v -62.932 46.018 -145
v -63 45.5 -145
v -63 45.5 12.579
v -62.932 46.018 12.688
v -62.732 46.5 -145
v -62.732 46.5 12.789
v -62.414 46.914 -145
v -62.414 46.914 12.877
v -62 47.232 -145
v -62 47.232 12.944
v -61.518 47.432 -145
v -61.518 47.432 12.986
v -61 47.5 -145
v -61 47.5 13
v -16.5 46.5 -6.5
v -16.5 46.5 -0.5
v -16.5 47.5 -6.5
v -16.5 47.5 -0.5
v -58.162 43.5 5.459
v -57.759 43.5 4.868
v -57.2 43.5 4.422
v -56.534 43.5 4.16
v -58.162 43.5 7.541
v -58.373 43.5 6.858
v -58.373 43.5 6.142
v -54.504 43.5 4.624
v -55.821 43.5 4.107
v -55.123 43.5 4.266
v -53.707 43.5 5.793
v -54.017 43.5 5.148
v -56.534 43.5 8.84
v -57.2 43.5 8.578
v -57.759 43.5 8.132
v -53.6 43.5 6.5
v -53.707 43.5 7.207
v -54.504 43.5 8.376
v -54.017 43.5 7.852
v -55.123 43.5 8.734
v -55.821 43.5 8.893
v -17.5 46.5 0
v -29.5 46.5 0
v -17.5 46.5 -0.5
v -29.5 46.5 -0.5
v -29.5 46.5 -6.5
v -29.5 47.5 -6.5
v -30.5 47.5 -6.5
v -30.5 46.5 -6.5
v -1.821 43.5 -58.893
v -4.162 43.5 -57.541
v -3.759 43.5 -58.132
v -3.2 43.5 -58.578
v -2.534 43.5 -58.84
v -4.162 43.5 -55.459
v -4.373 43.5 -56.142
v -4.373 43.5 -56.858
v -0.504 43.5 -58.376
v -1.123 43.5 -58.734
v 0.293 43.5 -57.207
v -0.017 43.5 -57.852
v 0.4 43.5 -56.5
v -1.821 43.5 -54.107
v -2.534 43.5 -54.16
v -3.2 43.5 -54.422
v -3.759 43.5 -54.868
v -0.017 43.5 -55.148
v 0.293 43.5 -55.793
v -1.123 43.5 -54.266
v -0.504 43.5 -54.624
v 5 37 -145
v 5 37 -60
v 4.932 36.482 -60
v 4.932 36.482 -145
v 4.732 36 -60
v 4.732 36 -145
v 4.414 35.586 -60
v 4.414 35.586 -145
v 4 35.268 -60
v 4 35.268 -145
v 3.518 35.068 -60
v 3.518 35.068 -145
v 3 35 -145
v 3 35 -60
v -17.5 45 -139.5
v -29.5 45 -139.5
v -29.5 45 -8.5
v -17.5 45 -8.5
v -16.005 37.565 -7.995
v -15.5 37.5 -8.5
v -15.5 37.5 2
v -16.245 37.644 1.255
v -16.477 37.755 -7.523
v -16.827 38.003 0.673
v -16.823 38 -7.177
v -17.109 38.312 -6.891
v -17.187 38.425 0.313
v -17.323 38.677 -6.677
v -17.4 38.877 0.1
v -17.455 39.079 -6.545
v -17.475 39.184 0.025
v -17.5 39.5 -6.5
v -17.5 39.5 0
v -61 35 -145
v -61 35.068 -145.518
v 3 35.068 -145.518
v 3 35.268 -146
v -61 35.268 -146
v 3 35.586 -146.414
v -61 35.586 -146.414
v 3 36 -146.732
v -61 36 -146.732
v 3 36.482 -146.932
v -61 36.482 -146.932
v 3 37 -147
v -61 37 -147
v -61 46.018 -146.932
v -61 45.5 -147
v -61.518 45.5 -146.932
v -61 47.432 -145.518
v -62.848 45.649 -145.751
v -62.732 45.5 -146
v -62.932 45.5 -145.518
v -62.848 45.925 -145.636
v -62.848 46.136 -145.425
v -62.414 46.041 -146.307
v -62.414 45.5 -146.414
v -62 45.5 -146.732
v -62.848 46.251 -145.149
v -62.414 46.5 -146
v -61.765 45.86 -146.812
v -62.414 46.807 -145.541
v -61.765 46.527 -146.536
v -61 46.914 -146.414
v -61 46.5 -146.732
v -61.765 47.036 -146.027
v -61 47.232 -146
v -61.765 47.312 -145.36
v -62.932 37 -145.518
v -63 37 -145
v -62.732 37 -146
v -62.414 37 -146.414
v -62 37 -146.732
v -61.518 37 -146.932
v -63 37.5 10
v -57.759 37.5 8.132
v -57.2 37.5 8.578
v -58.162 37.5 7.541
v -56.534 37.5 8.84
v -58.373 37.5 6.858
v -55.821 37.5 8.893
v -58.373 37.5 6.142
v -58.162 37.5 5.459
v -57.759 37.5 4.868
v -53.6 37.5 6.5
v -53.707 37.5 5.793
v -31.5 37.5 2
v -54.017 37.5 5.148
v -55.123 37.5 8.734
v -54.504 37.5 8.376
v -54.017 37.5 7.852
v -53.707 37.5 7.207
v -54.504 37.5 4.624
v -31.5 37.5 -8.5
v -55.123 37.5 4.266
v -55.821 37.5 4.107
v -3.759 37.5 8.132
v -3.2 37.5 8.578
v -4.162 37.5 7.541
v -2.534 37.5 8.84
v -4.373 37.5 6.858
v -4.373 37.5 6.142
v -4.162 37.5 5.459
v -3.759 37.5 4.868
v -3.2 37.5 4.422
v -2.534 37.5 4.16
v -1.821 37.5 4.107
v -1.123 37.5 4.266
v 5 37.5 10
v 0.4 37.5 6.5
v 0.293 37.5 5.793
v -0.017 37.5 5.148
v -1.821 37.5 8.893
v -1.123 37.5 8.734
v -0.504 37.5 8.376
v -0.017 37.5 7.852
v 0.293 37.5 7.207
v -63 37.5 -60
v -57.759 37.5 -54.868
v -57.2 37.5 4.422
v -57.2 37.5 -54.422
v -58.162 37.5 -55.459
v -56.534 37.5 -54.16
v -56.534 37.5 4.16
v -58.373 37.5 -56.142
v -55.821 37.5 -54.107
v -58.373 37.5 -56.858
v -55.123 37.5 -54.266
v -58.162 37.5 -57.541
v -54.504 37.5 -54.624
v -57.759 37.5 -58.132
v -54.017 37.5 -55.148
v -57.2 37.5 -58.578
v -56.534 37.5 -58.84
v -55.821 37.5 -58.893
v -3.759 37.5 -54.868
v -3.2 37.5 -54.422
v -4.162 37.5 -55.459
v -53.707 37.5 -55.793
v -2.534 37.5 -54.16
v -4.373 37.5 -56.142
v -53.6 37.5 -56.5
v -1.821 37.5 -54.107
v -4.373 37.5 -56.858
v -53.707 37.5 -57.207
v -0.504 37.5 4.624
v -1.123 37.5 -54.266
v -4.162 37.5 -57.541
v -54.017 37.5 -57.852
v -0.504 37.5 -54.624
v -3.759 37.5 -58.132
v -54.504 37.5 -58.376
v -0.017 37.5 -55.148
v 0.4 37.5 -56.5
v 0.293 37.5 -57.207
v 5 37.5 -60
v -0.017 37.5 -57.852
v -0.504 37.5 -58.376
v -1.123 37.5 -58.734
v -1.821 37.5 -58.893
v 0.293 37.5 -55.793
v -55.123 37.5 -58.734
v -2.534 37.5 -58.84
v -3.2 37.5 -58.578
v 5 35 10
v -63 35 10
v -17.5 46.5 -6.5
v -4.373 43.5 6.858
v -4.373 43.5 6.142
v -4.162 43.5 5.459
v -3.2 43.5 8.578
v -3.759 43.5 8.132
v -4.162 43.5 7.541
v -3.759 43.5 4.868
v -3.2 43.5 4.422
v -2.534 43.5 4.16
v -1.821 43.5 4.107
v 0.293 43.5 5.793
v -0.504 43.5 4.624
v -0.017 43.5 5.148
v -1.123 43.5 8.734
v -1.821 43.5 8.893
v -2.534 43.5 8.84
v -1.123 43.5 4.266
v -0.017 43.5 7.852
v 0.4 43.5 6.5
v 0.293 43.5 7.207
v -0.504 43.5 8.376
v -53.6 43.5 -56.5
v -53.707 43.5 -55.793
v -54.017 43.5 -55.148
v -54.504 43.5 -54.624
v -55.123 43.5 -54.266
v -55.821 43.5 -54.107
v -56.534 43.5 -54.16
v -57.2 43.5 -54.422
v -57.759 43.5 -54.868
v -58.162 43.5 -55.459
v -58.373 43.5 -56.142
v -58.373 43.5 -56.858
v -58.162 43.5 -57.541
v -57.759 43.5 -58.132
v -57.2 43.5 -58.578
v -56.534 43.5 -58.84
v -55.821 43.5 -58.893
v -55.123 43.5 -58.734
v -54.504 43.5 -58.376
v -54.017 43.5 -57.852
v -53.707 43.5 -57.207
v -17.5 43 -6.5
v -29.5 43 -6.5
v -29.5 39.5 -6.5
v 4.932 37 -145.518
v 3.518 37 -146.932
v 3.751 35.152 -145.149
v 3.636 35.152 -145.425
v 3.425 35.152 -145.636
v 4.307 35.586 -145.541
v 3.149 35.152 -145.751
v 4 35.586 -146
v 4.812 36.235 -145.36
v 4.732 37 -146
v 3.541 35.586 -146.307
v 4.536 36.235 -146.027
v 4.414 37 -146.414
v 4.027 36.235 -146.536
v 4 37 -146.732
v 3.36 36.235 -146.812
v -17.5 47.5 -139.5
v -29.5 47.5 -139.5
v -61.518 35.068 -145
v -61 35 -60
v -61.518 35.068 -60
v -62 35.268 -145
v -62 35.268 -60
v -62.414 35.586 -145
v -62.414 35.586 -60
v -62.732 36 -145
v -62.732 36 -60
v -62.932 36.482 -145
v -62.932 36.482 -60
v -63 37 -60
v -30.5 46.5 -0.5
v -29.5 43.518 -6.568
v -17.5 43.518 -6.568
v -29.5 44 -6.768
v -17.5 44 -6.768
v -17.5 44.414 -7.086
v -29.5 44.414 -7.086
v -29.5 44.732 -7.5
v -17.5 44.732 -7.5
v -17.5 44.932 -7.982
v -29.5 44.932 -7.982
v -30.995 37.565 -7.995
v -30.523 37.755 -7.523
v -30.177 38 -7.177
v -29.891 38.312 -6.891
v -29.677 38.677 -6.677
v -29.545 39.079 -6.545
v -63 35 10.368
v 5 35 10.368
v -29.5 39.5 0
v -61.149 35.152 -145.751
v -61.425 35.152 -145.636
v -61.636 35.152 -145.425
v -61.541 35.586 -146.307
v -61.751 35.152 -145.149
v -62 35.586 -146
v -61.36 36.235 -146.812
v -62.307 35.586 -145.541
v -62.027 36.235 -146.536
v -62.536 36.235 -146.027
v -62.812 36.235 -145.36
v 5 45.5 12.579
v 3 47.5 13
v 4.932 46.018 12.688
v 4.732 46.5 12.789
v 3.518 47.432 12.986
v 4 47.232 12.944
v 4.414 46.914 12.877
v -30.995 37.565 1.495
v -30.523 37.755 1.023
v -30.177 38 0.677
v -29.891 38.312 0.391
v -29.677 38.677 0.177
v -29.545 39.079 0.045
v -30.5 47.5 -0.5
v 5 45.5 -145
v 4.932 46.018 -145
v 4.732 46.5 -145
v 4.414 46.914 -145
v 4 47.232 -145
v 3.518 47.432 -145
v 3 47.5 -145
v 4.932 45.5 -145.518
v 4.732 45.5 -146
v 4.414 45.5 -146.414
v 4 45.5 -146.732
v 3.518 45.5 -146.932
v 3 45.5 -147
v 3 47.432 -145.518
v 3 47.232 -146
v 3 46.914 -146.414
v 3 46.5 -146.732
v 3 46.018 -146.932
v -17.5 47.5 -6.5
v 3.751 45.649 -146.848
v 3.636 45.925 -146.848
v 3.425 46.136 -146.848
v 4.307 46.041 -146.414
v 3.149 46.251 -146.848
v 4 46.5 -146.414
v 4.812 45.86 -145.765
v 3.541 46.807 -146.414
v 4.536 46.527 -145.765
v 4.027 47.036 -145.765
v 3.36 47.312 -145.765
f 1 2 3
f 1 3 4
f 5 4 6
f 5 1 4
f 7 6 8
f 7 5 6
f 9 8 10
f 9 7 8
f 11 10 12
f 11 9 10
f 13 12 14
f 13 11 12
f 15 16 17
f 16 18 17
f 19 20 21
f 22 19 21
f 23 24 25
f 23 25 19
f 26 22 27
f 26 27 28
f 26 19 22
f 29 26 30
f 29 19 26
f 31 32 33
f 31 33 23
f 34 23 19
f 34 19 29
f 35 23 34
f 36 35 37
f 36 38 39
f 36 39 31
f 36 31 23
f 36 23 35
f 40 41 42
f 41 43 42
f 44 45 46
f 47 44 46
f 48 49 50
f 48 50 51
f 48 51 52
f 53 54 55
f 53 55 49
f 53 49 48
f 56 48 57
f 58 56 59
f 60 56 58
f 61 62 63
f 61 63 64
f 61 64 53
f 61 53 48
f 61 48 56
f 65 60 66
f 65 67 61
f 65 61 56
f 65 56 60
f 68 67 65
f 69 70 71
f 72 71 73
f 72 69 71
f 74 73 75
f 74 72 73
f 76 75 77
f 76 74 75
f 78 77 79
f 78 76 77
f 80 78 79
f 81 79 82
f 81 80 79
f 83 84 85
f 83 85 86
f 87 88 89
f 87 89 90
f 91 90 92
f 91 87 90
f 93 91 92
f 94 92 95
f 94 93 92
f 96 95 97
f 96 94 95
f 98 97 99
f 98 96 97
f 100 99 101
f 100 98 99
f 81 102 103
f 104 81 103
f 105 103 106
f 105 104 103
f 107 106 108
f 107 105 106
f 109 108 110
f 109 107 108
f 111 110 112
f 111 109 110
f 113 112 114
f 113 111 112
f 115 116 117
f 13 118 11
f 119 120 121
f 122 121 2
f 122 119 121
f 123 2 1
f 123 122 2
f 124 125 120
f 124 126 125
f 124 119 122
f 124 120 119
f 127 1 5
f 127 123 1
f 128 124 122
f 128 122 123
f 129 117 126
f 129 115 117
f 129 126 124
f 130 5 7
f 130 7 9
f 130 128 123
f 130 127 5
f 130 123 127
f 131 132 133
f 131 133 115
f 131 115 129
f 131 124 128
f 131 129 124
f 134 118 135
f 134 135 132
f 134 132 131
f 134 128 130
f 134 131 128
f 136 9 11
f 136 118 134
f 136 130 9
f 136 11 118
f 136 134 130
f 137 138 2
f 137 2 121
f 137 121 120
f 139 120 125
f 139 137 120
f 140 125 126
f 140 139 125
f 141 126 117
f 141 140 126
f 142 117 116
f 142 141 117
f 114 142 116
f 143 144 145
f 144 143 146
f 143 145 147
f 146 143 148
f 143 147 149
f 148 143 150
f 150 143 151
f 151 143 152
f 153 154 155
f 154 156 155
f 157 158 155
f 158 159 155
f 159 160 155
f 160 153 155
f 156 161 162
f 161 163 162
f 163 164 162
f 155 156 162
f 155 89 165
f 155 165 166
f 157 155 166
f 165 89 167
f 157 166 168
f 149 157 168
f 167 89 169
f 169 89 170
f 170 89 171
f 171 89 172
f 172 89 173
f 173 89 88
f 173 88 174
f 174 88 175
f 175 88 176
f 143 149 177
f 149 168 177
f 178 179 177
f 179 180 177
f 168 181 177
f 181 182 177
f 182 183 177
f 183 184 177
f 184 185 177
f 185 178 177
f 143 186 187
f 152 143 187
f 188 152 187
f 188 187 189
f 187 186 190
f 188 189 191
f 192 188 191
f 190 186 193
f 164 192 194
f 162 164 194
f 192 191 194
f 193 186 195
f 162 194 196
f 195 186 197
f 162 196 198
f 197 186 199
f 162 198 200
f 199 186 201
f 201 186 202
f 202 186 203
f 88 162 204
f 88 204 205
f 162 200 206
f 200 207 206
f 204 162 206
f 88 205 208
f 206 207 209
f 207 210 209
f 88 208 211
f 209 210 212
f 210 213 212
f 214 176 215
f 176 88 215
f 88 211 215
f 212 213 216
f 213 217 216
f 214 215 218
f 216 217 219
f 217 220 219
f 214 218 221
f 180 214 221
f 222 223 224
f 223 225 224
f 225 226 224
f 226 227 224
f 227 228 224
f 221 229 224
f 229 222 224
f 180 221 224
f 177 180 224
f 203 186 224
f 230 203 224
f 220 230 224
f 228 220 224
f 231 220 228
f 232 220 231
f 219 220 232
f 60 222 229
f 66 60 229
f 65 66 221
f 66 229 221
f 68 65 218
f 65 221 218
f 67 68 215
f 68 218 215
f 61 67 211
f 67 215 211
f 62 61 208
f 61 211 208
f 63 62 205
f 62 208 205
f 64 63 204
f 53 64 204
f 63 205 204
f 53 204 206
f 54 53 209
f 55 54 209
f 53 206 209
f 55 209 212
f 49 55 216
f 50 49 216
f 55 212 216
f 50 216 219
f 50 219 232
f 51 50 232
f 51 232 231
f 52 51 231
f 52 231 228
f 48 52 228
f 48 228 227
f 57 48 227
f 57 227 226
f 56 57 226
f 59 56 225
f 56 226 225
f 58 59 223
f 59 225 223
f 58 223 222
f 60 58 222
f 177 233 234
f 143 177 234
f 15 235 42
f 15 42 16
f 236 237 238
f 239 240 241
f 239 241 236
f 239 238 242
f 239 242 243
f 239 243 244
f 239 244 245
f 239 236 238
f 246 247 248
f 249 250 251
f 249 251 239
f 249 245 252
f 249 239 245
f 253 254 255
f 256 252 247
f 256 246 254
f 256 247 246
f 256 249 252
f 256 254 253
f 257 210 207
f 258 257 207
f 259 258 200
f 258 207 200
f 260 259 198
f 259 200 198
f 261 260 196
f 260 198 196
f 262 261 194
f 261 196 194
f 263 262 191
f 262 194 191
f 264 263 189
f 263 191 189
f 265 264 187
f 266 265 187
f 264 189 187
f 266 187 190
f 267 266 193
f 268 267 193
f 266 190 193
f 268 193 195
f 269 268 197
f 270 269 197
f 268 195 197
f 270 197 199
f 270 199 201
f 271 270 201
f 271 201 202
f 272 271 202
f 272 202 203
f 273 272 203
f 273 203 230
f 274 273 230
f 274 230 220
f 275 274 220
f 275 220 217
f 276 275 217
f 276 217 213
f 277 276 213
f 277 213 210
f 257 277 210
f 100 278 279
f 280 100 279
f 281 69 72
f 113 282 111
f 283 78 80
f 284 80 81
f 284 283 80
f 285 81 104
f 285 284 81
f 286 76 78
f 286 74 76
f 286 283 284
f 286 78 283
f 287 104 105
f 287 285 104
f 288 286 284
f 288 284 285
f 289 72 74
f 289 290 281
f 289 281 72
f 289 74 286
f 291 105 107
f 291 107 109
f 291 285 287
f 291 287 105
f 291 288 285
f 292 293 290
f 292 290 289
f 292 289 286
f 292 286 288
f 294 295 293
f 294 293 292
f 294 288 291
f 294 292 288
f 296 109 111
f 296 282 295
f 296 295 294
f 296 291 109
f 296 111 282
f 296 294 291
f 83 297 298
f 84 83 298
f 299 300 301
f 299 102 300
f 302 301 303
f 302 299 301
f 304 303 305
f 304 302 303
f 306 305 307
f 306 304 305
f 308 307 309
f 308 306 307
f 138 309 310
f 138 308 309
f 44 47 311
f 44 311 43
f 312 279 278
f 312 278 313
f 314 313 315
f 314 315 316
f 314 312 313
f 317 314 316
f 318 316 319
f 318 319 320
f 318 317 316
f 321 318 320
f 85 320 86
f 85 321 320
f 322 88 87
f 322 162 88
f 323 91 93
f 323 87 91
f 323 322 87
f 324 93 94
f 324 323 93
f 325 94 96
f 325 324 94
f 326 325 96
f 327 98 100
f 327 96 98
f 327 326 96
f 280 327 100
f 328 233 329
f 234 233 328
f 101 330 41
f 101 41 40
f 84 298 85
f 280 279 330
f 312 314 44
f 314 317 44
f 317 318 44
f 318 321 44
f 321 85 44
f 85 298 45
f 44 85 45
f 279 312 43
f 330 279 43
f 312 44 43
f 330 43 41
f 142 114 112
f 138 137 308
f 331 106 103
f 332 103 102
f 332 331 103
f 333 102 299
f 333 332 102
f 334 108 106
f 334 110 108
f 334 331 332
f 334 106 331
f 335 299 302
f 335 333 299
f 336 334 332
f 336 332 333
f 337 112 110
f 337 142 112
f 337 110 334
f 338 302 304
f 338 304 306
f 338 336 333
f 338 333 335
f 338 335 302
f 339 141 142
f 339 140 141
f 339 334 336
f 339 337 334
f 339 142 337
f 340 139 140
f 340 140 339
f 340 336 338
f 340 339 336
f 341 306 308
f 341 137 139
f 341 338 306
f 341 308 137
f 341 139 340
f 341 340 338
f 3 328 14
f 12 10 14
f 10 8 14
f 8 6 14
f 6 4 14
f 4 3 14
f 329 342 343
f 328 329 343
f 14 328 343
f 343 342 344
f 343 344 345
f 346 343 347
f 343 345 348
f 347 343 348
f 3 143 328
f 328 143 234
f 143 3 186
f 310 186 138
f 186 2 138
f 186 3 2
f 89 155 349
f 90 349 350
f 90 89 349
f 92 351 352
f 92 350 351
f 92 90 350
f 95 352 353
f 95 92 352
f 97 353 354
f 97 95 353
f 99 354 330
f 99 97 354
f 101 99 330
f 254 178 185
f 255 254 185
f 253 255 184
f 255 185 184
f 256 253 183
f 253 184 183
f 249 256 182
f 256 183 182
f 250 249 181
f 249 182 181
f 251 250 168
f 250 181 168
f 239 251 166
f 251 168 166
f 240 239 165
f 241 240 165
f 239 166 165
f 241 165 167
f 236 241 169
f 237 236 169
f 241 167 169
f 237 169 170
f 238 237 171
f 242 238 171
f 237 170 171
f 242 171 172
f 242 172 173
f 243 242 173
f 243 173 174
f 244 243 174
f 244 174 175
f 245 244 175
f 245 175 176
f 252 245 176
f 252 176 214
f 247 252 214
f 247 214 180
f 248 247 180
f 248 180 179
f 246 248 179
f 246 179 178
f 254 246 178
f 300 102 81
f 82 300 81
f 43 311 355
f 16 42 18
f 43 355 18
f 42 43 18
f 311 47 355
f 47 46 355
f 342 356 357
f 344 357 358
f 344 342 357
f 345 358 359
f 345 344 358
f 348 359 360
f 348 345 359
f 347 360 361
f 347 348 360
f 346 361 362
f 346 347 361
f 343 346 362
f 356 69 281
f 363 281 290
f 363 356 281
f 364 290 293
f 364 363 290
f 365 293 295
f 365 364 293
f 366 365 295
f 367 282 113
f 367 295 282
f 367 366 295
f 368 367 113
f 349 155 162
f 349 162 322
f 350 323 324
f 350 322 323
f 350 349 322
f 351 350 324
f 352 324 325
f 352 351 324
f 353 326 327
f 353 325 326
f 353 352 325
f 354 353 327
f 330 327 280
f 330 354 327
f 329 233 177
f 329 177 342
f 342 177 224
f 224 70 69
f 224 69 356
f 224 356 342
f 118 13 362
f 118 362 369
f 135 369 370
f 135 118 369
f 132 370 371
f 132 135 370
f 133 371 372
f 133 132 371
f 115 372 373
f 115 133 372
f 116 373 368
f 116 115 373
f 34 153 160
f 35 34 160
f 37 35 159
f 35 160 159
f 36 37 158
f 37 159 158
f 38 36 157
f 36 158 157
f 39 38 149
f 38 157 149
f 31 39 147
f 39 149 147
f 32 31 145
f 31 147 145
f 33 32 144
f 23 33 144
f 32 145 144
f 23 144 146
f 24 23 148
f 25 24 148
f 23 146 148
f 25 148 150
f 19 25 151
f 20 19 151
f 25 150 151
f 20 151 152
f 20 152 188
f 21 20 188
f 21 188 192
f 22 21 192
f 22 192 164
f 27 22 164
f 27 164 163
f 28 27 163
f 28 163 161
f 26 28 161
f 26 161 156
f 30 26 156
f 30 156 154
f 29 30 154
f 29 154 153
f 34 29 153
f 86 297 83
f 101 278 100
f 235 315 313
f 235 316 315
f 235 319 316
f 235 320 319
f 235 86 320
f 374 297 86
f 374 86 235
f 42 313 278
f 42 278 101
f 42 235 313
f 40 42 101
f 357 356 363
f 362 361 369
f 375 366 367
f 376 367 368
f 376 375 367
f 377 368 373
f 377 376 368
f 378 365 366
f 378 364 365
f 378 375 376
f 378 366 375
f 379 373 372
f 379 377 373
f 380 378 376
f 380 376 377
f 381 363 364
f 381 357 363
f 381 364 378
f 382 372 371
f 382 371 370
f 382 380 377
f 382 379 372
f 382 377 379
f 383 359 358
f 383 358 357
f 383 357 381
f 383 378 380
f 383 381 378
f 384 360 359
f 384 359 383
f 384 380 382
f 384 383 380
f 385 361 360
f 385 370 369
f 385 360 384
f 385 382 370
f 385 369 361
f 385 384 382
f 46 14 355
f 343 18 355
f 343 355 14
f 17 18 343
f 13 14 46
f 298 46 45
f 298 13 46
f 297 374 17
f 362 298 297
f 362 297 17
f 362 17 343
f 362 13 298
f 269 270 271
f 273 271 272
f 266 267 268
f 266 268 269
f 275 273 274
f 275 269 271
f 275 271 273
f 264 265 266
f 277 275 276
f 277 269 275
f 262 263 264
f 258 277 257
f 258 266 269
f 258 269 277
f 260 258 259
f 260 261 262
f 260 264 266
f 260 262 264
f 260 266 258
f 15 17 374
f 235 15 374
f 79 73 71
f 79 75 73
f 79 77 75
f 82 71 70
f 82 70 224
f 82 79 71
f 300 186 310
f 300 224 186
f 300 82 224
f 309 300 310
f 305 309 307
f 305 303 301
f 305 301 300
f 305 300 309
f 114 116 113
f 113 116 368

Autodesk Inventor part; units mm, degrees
ref_plane "YZ Plane" through (0, 0, 0) normal (1, 0, 0) x (0, 1, 0)
ref_plane "XZ Plane" through (0, 0, 0) normal (0, 1, 0) x (-1, 0, 0)
ref_plane "XY Plane" through (0, 0, 0) normal (0, 0, 1) x (1, 0, 0)
sketch "Эскиз1" plane through (0, 0, 0) normal (0, 1, 0) x (-1, 0, 0)
  line L0 (0, -50) -> (58, -50)
  line L1 (-2, -2) -> (-2, -48)
  line L2 (58, 0) -> (0, 0)
  line L3 (60, -48) -> (60, -2)
  line L4 (-2, 0) -> (60, 0)
  line L5 (60, 0) -> (60, -50)
  line L6 (60, -50) -> (-2, -50)
  line L7 (-2, -50) -> (-2, 0)
  circle A0 centre (2, -4) radius 1.6
  circle A1 centre (55, -4) radius 1.6
  circle A2 centre (55, -46) radius 1.6
  circle A3 centre (2, -46) radius 1.6
  circle A4 centre (2, -4) radius 1.6
  circle A5 centre (55, -4) radius 1.6
  circle A6 centre (55, -46) radius 1.6
  circle A7 centre (2, -46) radius 1.6
  circle A8 centre (2, -4) radius 2.4
  circle A9 centre (2, -4) radius 4
  circle A10 centre (55, -4) radius 4
  circle A11 centre (55, -4) radius 2.4
  circle A12 centre (55, -46) radius 4
  circle A13 centre (55, -46) radius 2.4
  circle A14 centre (2, -46) radius 4
  circle A15 centre (2, -46) radius 2.4
  dimension "d0" = 4.8
  dimension "d1" = 8
  dimension "d2" = 4.8
  dimension "d3" = 8
  dimension "d4" = 4.8
  dimension "d5" = 8
  dimension "d6" = 4.8
  dimension "d7" = 8
extrude "Выдавливание1" add sketch "Эскиз1" along normal blind 2.5 contours L6 L7 L1 A14 L0 | A12 | A10 | A14 L1 A9 L2 L4 L5 L3 L6 L0 | A14 | L1 L7 L4 L2 A9 | A9 | A0 | A1 | A2 | A3 | A8 | A11 | A13 | A15
extrude "Выдавливание2" add sketch "Эскиз1" along normal blind 8.5 contours A12 | A10 | A14 | A9
sketch "Эскиз2" plane through (0, 0, 0) normal (0, -1, 0) x (1, 0, 0)
  line L0 (-60, 0) -> (2, 0) projected
  line L1 (2, 0) -> (2, -50) projected
  line L2 (2, -50) -> (-60, -50) projected
  line L3 (-60, -50) -> (-60, 0) projected
  line L4 (2, 0) -> (2, -50) projected
  line L5 (2.5, -50.5) -> (-60.5, -50.5)
  line L6 (-60.5, -50.5) -> (-60.5, 0.5)
  line L7 (-60.5, 0.5) -> (2.5, 0.5)
  line L8 (2.5, 0.5) -> (2.5, -50.5)
  line L9 (5, -50.5) -> (5, -53)
  line L10 (5, -53) -> (2.5, -53)
  line L11 (5, -53) -> (-63, -53)
  line L12 (-63, -53) -> (-63, 3)
  line L13 (-63, 3) -> (5, 3)
  line L14 (5, 3) -> (5, -53)
  point P0 (0, 0)
  dimension "d14" = 63
  dimension "d15" = 51
  dimension "d16" = 2.5
  dimension "d17" = 2.5
  dimension "d18" = 68
  dimension "d19" = 56
extrude "Выдавливание3" add sketch "Эскиз2" against normal blind 2.5 contours L5 L6 L7 L8
extrude "Выдавливание4" add sketch "Эскиз2" against normal blind 35 contours L9 L10 L11 L12 L13 L14
sketch "Эскиз3" plane through (-63, 0, 3) normal (0, 0, 1) x (1, 0, 0)
  line L0 (0, 0) -> (0, 35) projected
  line L1 (0, 35) -> (68, 35)
  line L2 (68, 35) -> (68, 50)
  line L3 (68, 50) -> (0, 50)
  line L4 (0, 50) -> (0, 35)
  point P0 (63, 0)
  dimension "d24" = 15
extrude "Выдавливание5" add sketch "Эскиз3" against normal blind 150
sketch "Эскиз4" plane through (-63, 50, 3) normal (0, 1, 0) x (1, 0, 0)
  line L0 (0, 0) -> (0, 56) projected
  line L1 (68, 0) -> (68, 150) projected
  line L2 (0, 0) -> (68, 0)
  line L3 (68, 0) -> (68, 150)
  line L4 (68, 150) -> (0, 150)
  line L5 (0, 150) -> (0, 0)
  point P0 (63, 3)
extrude "Выдавливание6" cut sketch "Эскиз4" against normal blind 2.5
sketch "Эскиз5" plane through (-63, 47.5, 3) normal (0, 1, 0) x (1, 0, 0)
  line L0 (0, 56) -> (0, 150) projected
  line L1 (0, 150) -> (10, 150)
  line L2 (10, 150) -> (10, 140)
  line L3 (10, 140) -> (0, 140)
  line L4 (0, 140) -> (0, 150)
  line L5 (68, 150) -> (0, 150) projected
  line L6 (68, 150) -> (58, 150)
  line L7 (58, 150) -> (58, 140)
  line L8 (58, 140) -> (68, 140)
  line L9 (68, 140) -> (68, 150)
  line L10 (0, 0) -> (0, 56) projected
  line L11 (0, 0) -> (10, 0)
  line L12 (10, 0) -> (10, 10)
  line L13 (10, 10) -> (0, 10)
  line L14 (0, 10) -> (0, 0)
  line L15 (10, 10) -> (58, 10)
  line L16 (58, 10) -> (58, 140)
  line L17 (58, 140) -> (10, 140)
  line L18 (10, 140) -> (10, 10)
  point P0 (63, 3)
  dimension "d29" = 10
  dimension "d30" = 10
  dimension "d31" = 10
  dimension "d32" = 10
  dimension "d33" = 10
  dimension "d34" = 10
extrude "Выдавливание7" cut sketch "Эскиз5" against normal blind 10 contours L17 L16 L15 L18
sketch "Эскиз6" plane through (-63, 37.5, 3) normal (0, 1, 0) x (1, 0, 0)
  line L0 (58, 140) -> (10, 140) projected
  line L1 (10, 140) -> (10, 10) projected
  line L2 (10, 10) -> (58, 10) projected
  line L3 (58, 10) -> (58, 140) projected
  line L4 (0, 150) -> (68, 150) projected
  line L5 (68, 150) -> (68, 0) projected
  line L6 (68, 0) -> (0, 0) projected
  line L7 (0, 0) -> (0, 150) projected
  line L8 (68, 56) -> (0, 56) projected
  line L9 (0, 56) -> (10, 56)
  line L10 (10, 56) -> (10, 46)
  line L11 (10, 46) -> (0, 46)
  line L12 (0, 46) -> (0, 56)
  line L13 (10, 46) -> (58, 46)
  line L14 (58, 46) -> (58, 10)
  line L15 (58, 10) -> (10, 10)
  line L16 (10, 10) -> (10, 46)
  point P0 (63, 3)
  dimension "d37" = 10
  dimension "d38" = 10
extrude "Выдавливание8" cut sketch "Эскиз6" against normal blind 10 contours L3 L2 L1 L13
sketch "Эскиз7" plane through (-63, 47.5, 3) normal (0, 1, 0) x (1, 0, 0)
  line L0 (0, 0) -> (0, 150) projected
  line L1 (0, 150) -> (2.5, 150)
  line L2 (2.5, 150) -> (2.5, 147.5)
  line L3 (2.5, 147.5) -> (0, 147.5)
  line L4 (0, 147.5) -> (0, 150)
  line L5 (68, 150) -> (68, 0) projected
  line L6 (68, 150) -> (65.5, 150)
  line L7 (65.5, 150) -> (65.5, 147.5)
  line L8 (65.5, 147.5) -> (68, 147.5)
  line L9 (68, 147.5) -> (68, 150)
  line L10 (2.5, 2.5) -> (2.5, 53.5) projected
  line L11 (65.5, 147.5) -> (2.5, 147.5)
  line L12 (2.5, 147.5) -> (2.5, 10)
  line L13 (2.5, 10) -> (65.5, 10)
  line L14 (65.5, 10) -> (65.5, 147.5)
  point P0 (63, 3)
  dimension "d41" = 2.5
  dimension "d42" = 2.5
  dimension "d43" = 2.5
  dimension "d44" = 2.5
  dimension "d45" = 137.5
extrude "Выдавливание9" cut sketch "Эскиз7" against normal blind 10 contours L11 L14 L13 L10 L12
sketch "Эскиз8" plane through (-63, 37.5, 3) normal (0, 1, 0) x (1, 0, 0)
  line L0 (58, 10) -> (58, 46) projected
  line L1 (58, 46) -> (10, 46) projected
  line L2 (10, 46) -> (10, 10) projected
  line L3 (2.5, 10) -> (10, 10) projected
  line L4 (2.5, 147.5) -> (2.5, 10) projected
  line L5 (65.5, 147.5) -> (2.5, 147.5) projected
  line L6 (65.5, 10) -> (65.5, 147.5) projected
  line L7 (58, 10) -> (65.5, 10) projected
  line L8 (10, 10) -> (58, 10) projected
  line L9 (0, 150) -> (68, 150) projected
  line L10 (68, 150) -> (68, 0) projected
  line L11 (68, 0) -> (0, 0) projected
  line L12 (0, 0) -> (0, 150) projected
  circle A0 centre (8, 49) radius 2.4 projected
  line L13 (2.5, 53.5) -> (65.5, 53.5) projected
  line L14 (65.5, 147.5) -> (65.5, 10) projected
  circle A1 centre (61, 49) radius 4 projected
  circle A2 centre (8, 7) radius 4 projected
  circle A3 centre (8, 49) radius 4 projected
  line L15 (2.5, 2.5) -> (65.5, 2.5) projected
  line L16 (65.5, 2.5) -> (65.5, 53.5) projected
  line L17 (65.5, 53.5) -> (2.5, 53.5) projected
  line L18 (2.5, 53.5) -> (2.5, 2.5) projected
  circle A4 centre (61, 7) radius 4 projected
  circle A5 centre (8, 7) radius 4 projected
  line L19 (2.5, 2.5) -> (2.5, 53.5) projected
  line L20 (65.5, 2.5) -> (2.5, 2.5) projected
  line L21 (65.5, 53.5) -> (65.5, 2.5) projected
  circle A6 centre (61, 7) radius 2.4 projected
  line L22 (2.5, 53.5) -> (65.5, 53.5)
  line L23 (65.5, 53.5) -> (65.5, 2.5)
  line L24 (65.5, 2.5) -> (2.5, 2.5)
  line L25 (2.5, 2.5) -> (2.5, 53.5)
  point P0 (63, 3)
  point P1 (58.3542, 10)
  point P2 (63.6458, 10)
  point P3 (10.6458, 10)
  point P4 (10, 10.4641)
  point P5 (10, 45.5359)
  point P6 (10.6458, 46)
extrude "Выдавливание10" cut sketch "Эскиз8" along normal mid plane 20 contours L0 L1 A3 L2 A2 L3 L4 L13 L6 L7 A4 | L7 A4 L16 L15 L18 L3 A2 L8 | A4 L7 | L7 A4 | A2 L3 L8 | L8 L2 A2 | A3 L2 L1 | L1 L2 A3 | L3 A2 L2 | A0 | A1 | A6
sketch "Эскиз9" plane through (-63, 0, 3) normal (0, 0, 1) x (1, 0, 0)
  line L0 (68, 0) -> (68, 47.5) projected
  line L1 (68, 35) -> (0, 35) projected
  line L2 (68, 47.5) -> (0, 47.5)
  line L3 (0, 47.5) -> (0, 35)
  line L4 (0, 35) -> (68, 35)
  line L5 (68, 35) -> (68, 47.5)
  point P0 (63, 0)
extrude "Выдавливание11" add sketch "Эскиз9" along normal blind 10
sketch "Эскиз12" plane through (-63, 37.5, 3) normal (0, 1, 0) x (1, 0, 0)
  line L0 (65.5, 2.5) -> (65.5, 53.5) projected
  line L1 (65.5, 53.5) -> (55.5, 53.5)
  line L2 (55.5, 53.5) -> (55.5, 63.5)
  line L3 (55.5, 63.5) -> (65.5, 63.5)
  line L4 (65.5, 63.5) -> (65.5, 53.5)
  line L5 (2.5, 53.5) -> (2.5, 2.5) projected
  line L6 (2.5, 53.5) -> (12.5, 53.5)
  line L7 (12.5, 53.5) -> (12.5, 63.5)
  line L8 (12.5, 63.5) -> (2.5, 63.5)
  line L9 (2.5, 63.5) -> (2.5, 53.5)
  point P0 (63, 3)
  dimension "d52" = 10
  dimension "d53" = 10
  dimension "d54" = 10
extrude "Выдавливание12" add sketch "Эскиз12" along normal blind 10
sketch "Эскиз16" plane through (0, 0, 0) normal (0, -1, 0) x (1, 0, 0)
  line L0 (5, -53) -> (5, 3) projected
  line L1 (-63, -53) -> (5, -53) projected
  line L2 (5, 3) -> (-63, 3)
  line L3 (-63, 3) -> (-63, -53)
  line L4 (-63, -53) -> (5, -53)
  line L5 (5, -53) -> (5, 3)
  line L6 (-63, -147) -> (-63, 13) projected
  line L7 (5, -53) -> (-63, -53)
  line L8 (-63, -53) -> (-63, -60)
  line L9 (-63, -60) -> (5, -60)
  line L10 (5, -60) -> (5, -53)
  line L11 (-63, 3) -> (-63, -53) projected
  line L12 (5, -147) -> (5, 13) projected
  line L13 (-63, 3) -> (5, 3)
  line L14 (5, 3) -> (5, 10)
  line L15 (5, 10) -> (-63, 10)
  line L16 (-63, 10) -> (-63, 3)
  point P0 (0, 0)
  dimension "d59" = 7
  dimension "d60" = 7
extrude "Выдавливание13" cut sketch "Эскиз16" against normal blind 37.5
sketch "Эскиз17" plane through (-63, 47.5, 3) normal (0, 1, 0) x (1, 0, 0)
  line L0 (68, -10) -> (0, -10)
  line L1 (0, -10) -> (0, 150)
  line L2 (0, 150) -> (68, 150)
  line L3 (68, 150) -> (68, -10)
  line L4 (45.5, 63.5) -> (45.5, 127.5)
  line L5 (2.5, 147.5) -> (65.5, 147.5) projected
  line L6 (45.5, 127.5) -> (45.5, 132.5)
  line L7 (33.5, 132.5) -> (33.5, 7.5)
  line L8 (33.5, 7.5) -> (45.5, 7.5)
  line L9 (45.5, 7.5) -> (45.5, 63.5)
  line L10 (33.5, 132.5) -> (32, 132.5)
  line L11 (32, 132.5) -> (32, 134)
  line L12 (32, 134) -> (33.5, 134)
  line L13 (33.5, 134) -> (33.5, 132.5)
  line L14 (45.5, 7.5) -> (47, 7.5)
  line L15 (47, 7.5) -> (47, 6)
  line L16 (47, 6) -> (45.5, 6)
  line L17 (45.5, 6) -> (45.5, 7.5)
  line L18 (47, 6) -> (32, 6)
  line L19 (32, 6) -> (32, 134)
  line L20 (47, 134) -> (47, 6)
  line L21 (45.5, 134) -> (45.5, 132.5)
  line L22 (33.5, 132.5) -> (33.5, 134)
  line L23 (47, 134) -> (47, 144)
  line L24 (47, 144) -> (32, 144)
  line L25 (32, 144) -> (32, 134)
  line L26 (33.5, 134) -> (32, 134)
  line L27 (32, 134) -> (32, 144)
  line L28 (32, 144) -> (33.5, 144)
  line L29 (33.5, 144) -> (33.5, 134)
  line L30 (45.5, 134) -> (47, 134)
  line L31 (47, 134) -> (47, 144)
  line L32 (47, 144) -> (45.5, 144)
  line L33 (45.5, 144) -> (45.5, 134)
  line L34 (32, 144) -> (47, 144)
  line L35 (47, 144) -> (47, 142.5)
  line L36 (47, 142.5) -> (32, 142.5)
  line L37 (32, 142.5) -> (32, 144)
  line L38 (32, 6) -> (47, 6)
  line L39 (47, 6) -> (47, 7.5)
  line L40 (47, 7.5) -> (32, 7.5)
  line L41 (32, 7.5) -> (32, 6)
  point P0 (63, 3)
  point P1 (55.5, 63.5)
  point P2 (33.5, 142.5)
  point P3 (45.5, 142.5)
  dimension "d64" = 64
  dimension "d65" = 5
  dimension "d66" = 12
  dimension "d67" = 125
  dimension "d68" = 1.5
  dimension "d69" = 1.5
  dimension "d70" = 1.5
  dimension "d71" = 1.5
  dimension "d72" = 10
  dimension "d73" = 1.5
extrude "Выдавливание14" add sketch "Эскиз17" against normal up to surface (10 mm away) contours L4 L6 L21 L30 L20 L14 L9 | L40 L19 L10 L7 | L33 L36 L23 L30 | L10 L11 L12 L13 | L36 L29 L24 L33 | L33 L24 L23 L36 | L12 L25 L36 L29 | L36 L25 L24 L29
sketch "Эскиз18" plane through (-63, 37.5, 3) normal (0, 1, 0) x (1, 0, 0)
  line L0 (45.5, 142.5) -> (45.5, 7.5) projected
  line L1 (33.5, 142.5) -> (45.5, 142.5)
  line L2 (45.5, 142.5) -> (45.5, 7.5)
  line L3 (45.5, 7.5) -> (33.5, 7.5)
  line L4 (33.5, 7.5) -> (33.5, 142.5)
  point P0 (63, 3)
extrude "Выдавливание15" add sketch "Эскиз18" along normal blind 7.5
sketch "Эскиз19" plane through (-63, 47.5, 3) normal (0, 1, 0) x (1, 0, 0)
  line L0 (68, 150) -> (0, 150) projected
  line L1 (68, 150) -> (68, -10) projected
  line L2 (0, 150) -> (68, 150)
  line L3 (68, 150) -> (68, -10)
  line L4 (68, -10) -> (0, -10)
  line L5 (0, -10) -> (0, 150)
  point P0 (63, 3)
sketch "Эскиз20" plane through (-63, 37.5, 3) normal (0, 1, 0) x (1, 0, 0)
  line L0 (2.5, 147.5) -> (65.5, 147.5) projected
  line L1 (32, 63) -> (32, 7.5) projected
  line L2 (2.5, 147.5) -> (32, 147.5)
  line L3 (32, 147.5) -> (32, 63)
  line L4 (32, 63) -> (2.5, 63)
  line L5 (2.5, 63) -> (2.5, 147.5)
  line L6 (47, 7.5) -> (47, 144) projected
  line L7 (32, 147.5) -> (47, 147.5)
  line L8 (47, 147.5) -> (47, 144)
  line L9 (47, 144) -> (32, 144)
  line L10 (32, 144) -> (32, 147.5)
  line L11 (47, 147.5) -> (65.5, 147.5)
  line L12 (65.5, 147.5) -> (65.5, 63)
  line L13 (65.5, 63) -> (47, 63)
  line L14 (47, 63) -> (47, 147.5)
  point P0 (63, 3)
extrude "Выдавливание16" add sketch "Эскиз20" along normal blind 10
sketch "Эскиз21" plane through (-63, 47.5, 3) normal (0, 1, 0) x (1, 0, 0)
  line L0 (12.5, 63) -> (32, 63) projected
  line L1 (65.5, 2.5) -> (2.5, 2.5) projected
  line L2 (32, 63) -> (2.5, 63)
  line L3 (2.5, 63) -> (2.5, 2.5)
  line L4 (2.5, 2.5) -> (32, 2.5)
  line L5 (32, 2.5) -> (32, 63)
  line L6 (47, 63) -> (55.5, 63) projected
  line L7 (65.5, 53.5) -> (65.5, 2.5) projected
  line L8 (47, 63) -> (65.5, 63)
  line L9 (65.5, 63) -> (65.5, 2.5)
  line L10 (65.5, 2.5) -> (47, 2.5)
  line L11 (47, 2.5) -> (47, 63)
  line L12 (32, 2.5) -> (47, 2.5)
  line L13 (47, 2.5) -> (47, 5.5)
  line L14 (47, 5.5) -> (32, 5.5)
  line L15 (32, 5.5) -> (32, 2.5)
  point P0 (63, 3)
  dimension "d80" = 3
extrude "Выдавливание17" add sketch "Эскиз21" against normal blind 10
sketch "Эскиз22" plane through (0, 37.5, 0) normal (0, -1, 0) x (1, 0, 0)
  line L0 (-16, -4.5) -> (-16, -2.5) projected
  line L1 (-16, -2.5) -> (-31, -2.5)
  line L2 (-31, -2.5) -> (-31, 0)
  line L3 (-31, 0) -> (-16, 0)
  line L4 (-16, 0) -> (-16, -2.5)
  point P0 (0, 0)
extrude "Выдавливание18" cut sketch "Эскиз22" against normal blind 10
sketch "Эскиз23" plane through (-63, 47.5, 3) normal (0, 1, 0) x (1, 0, 0)
  line L0 (33.5, 7.5) -> (45.5, 7.5) projected
  line L1 (45.5, 142.5) -> (45.5, 7.5) projected
  line L2 (33.5, 7.5) -> (45.5, 7.5)
  line L3 (45.5, 7.5) -> (45.5, 9.5)
  line L4 (45.5, 9.5) -> (33.5, 9.5)
  line L5 (33.5, 9.5) -> (33.5, 7.5)
  point P0 (63, 3)
  dimension "d85" = 2
extrude "Выдавливание19" cut sketch "Эскиз23" against normal blind 10
sketch "Эскиз24" plane through (-63, 47.5, 3) normal (0, 1, 0) x (1, 0, 0)
  line L0 (32, 7.5) -> (33.5, 7.5) projected
  line L1 (47, 3) -> (32, 3) projected
  line L2 (33.5, 7.5) -> (32, 7.5)
  line L3 (32, 7.5) -> (32, 3)
  line L4 (32, 3) -> (33.5, 3)
  line L5 (33.5, 3) -> (33.5, 7.5)
  line L6 (45.5, 7.5) -> (47, 7.5) projected
  line L7 (45.5, 7.5) -> (47, 7.5)
  line L8 (47, 7.5) -> (47, 3)
  line L9 (47, 3) -> (45.5, 3)
  line L10 (45.5, 3) -> (45.5, 7.5)
  point P0 (63, 3)
extrude "Выдавливание20" add sketch "Эскиз24" against normal blind 10
sketch "Эскиз25" plane through (-63, 47.5, 3) normal (0, 1, 0) x (1, 0, 0)
  line L0 (33.5, 3) -> (33.5, 142.5) projected
  line L1 (45.5, 142.5) -> (45.5, 3) projected
  line L2 (33.5, 3) -> (45.5, 3)
  line L3 (45.5, 3) -> (45.5, 10.5)
  line L4 (45.5, 10.5) -> (33.5, 10.5)
  line L5 (33.5, 10.5) -> (33.5, 3)
  point P0 (63, 3)
  dimension "d90" = 7.5
extrude "Выдавливание21" add sketch "Эскиз25" against normal blind 1
sketch "Эскиз26" plane through (0, 37.5, 0) normal (0, -1, 0) x (1, 0, 0)
  point P0 (0, 0)
sketch "Эскиз27" plane through (0, 37.5, 0) normal (0, -1, 0) x (1, 0, 0)
  line L0 (-29.5, 0) -> (-29.5, -6.5) projected
  line L1 (-29.5, -6.5) -> (-17.5, -6.5) projected
  line L2 (-17.5, -6.5) -> (-17.5, 0) projected
  line L3 (-17.5, 0) -> (-29.5, 0) projected
  line L4 (-63, -60) -> (5, -60) projected
  line L5 (5, 10) -> (5, -60) projected
  line L6 (5, 13) -> (5, 10) projected
  line L7 (-63, 13) -> (5, 13) projected
  line L8 (-63, 10) -> (-63, 13) projected
  line L9 (5, 10) -> (-63, 10) projected
  line L10 (-63, -60) -> (-63, 10) projected
  line L11 (-63, -147) -> (-63, -60) projected
  line L12 (5, -147) -> (-63, -147) projected
  line L13 (5, -60) -> (5, -147) projected
  line L14 (5, 10) -> (-2, 10)
  line L15 (-2, 10) -> (-2, 3)
  line L16 (-2, 3) -> (5, 3)
  line L17 (5, 3) -> (5, 10)
  line L18 (-63, 10) -> (-56, 10)
  line L19 (-56, 10) -> (-56, 3)
  line L20 (-56, 3) -> (-63, 3)
  line L21 (-63, 3) -> (-63, 10)
  line L22 (-63, -60) -> (-56, -60)
  line L23 (-56, -60) -> (-56, -53)
  line L24 (-56, -53) -> (-63, -53)
  line L25 (-63, -53) -> (-63, -60)
  line L26 (5, -60) -> (-63, -60) projected
  line L27 (5, -60) -> (-2, -60)
  line L28 (-2, -60) -> (-2, -53)
  line L29 (-2, -53) -> (5, -53)
  line L30 (5, -53) -> (5, -60)
  circle A0 centre (-2, -56.5) radius 2.4
  circle A1 centre (-56, -56.5) radius 2.4
  circle A2 centre (-56, 6.5) radius 2.4
  circle A3 centre (-2, 6.5) radius 2.4
  point P0 (0, 0)
  dimension "d93" = 7
  dimension "d94" = 7
  dimension "d95" = 7
  dimension "d96" = 7
  dimension "d97" = 4.8
extrude "Выдавливание22" cut sketch "Эскиз27" against normal blind 6 contours A1 L23 | L23 A1 | A0 L28 | L28 A0 | A2 L19 | L19 A2 | A3 L15 | L15 A3
sketch "Эскиз28" plane through (5, 35, -147) normal (1, 0, 0) x (0, 0, -1)
  line L0 (-160, 0) -> (-160, 12.5)
  line L1 (-150, -35) -> (-160, 0)
  line L2 (-150, -35) -> (-160, 12.5)
  line L3 (-160, 0) -> (-150, -35)
  line L4 (-160, 12.5) -> (-160, 0) projected
  line L5 (0, 12.5) -> (-160, 12.5) projected
  point P0 (-147, -35)
extrude "Выдавливание23" cut sketch "Эскиз28" against normal through all
fillet "Сопряжение1" radius 2 8 edges at (5, 47.5, -67) (-29, 47.5, -147) (-63, 47.5, -67) (5, 41.25, -147) (-63, 41.25, -147) (-29, 35, -147) (5, 35, -103.5) (-63, 35, -103.5)
fillet "Сопряжение2" radius 2 1 edges at (-23.5, 45, -6.5)
fillet "Сопряжение3" radius 2 4 edges at (-23.5, 37.5, -6.5) (-17.5, 37.5, -3.25) (-29.5, 37.5, -3.25) (-23.5, 37.5, 0)
sketch "Эскиз29" plane through (0, 37.5, 0) normal (0, -1, 0) x (1, 0, 0)
  line L0 (-31.5, -8.5) -> (-29.5, -6.5) projected
  line L1 (-31.5, -8.5) -> (-31.5, -28.5)
  line L2 (-31.5, -28.5) -> (-15.5, -28.5)
  line L3 (-15.5, -28.5) -> (-15.5, -22.5)
  line L4 (-15.5, -22.5) -> (-31.5, -22.5)
  line L5 (-31.5, -28.5) -> (-28.5, -28.5)
  line L6 (-28.5, -28.5) -> (-28.5, -22.5)
  line L7 (-28.5, -22.5) -> (-31.5, -22.5)
  line L8 (-31.5, -22.5) -> (-31.5, -28.5)
  point P0 (0, 0)
  dimension "d105" = 20
  dimension "d106" = 3
extrude "Выдавливание24" add sketch "Эскиз29" along normal blind 5 contours L4 L6 L2 L1
sketch "Эскиз30" plane through (0, 32.5, 0) normal (0, -1, 0) x (1, 0, 0)
  line L0 (-31.5, -28.5) -> (-31.5, -22.5) projected
  line L1 (-31.5, -28.5) -> (-16.5, -28.5)
  line L2 (-16.5, -28.5) -> (-16.5, -22.5)
  line L3 (-16.5, -22.5) -> (-31.5, -22.5)
  line L4 (-31.5, -22.5) -> (-31.5, -28.5)
  point P0 (0, 0)
  dimension "d109" = 15
extrude "Выдавливание25" add sketch "Эскиз30" against normal blind 2
fillet "Сопряжение4" radius 1 13 edges at (-28.5, 37.5, -25.5) (-30, 37.5, -22.5) (-31.5, 37.5, -25.5) (-30, 37.5, -28.5) (-31.5, 32.5, -25.5) (-24, 32.5, -22.5) (-24, 32.5, -28.5) (-16.5, 32.5, -25.5) (-28.5, 34.5, -25.5) (-31.5, 35, -22.5) (-28.5, 36, -22.5) (-28.5, 36, -28.5) (-31.5, 35, -28.5)
sketch "Эскиз31" plane through (-63, 47.5, 3) normal (0, 1, 0) x (1, 0, 0)
  line L0 (45.5, 3) -> (45.5, 10.5) projected
  line L1 (33.5, 9.5) -> (33.5, 3) projected
  line L2 (45.5, 10.5) -> (33.5, 10.5)
  line L3 (33.5, 10.5) -> (33.5, 5.5)
  line L4 (33.5, 5.5) -> (45.5, 5.5)
  line L5 (45.5, 5.5) -> (45.5, 10.5)
  point P0 (63, 3)
  point P1 (45.5, 5.5)
  dimension "d113" = 5
extrude "Выдавливание26" cut sketch "Эскиз31" against normal blind 2
sketch "Эскиз32" plane through (-63, 47.5, 3) normal (0, 1, 0) x (1, 0, 0)
  line L0 (33.5, 5.5) -> (45.5, 5.5) projected
  line L1 (32.5, 3.5) -> (46.5, 3.5)
  line L2 (46.5, 3.5) -> (46.5, 9.5)
  line L3 (46.5, 9.5) -> (32.5, 9.5)
  line L4 (32.5, 9.5) -> (32.5, 3.5)
  point P0 (63, 3)
  dimension "d118" = 14
extrude "Выдавливание27" cut sketch "Эскиз32" against normal blind 1
sketch "Эскиз33" plane through (0, 32.5, 0) normal (0, -1, 0) x (1, 0, 0)
  line L0 (-35.6143, -40.4907) -> (-11.0678, -40.4907)
  line L1 (-11.0678, -40.4907) -> (-11.0678, -15.5059)
  line L2 (-11.0678, -15.5059) -> (-35.6143, -15.5059)
  line L3 (-35.6143, -15.5059) -> (-35.6143, -40.4907)
  point P0 (0, 0)
extrude "Выдавливание28" cut sketch "Эскиз33" against normal up to surface (5 mm away)
properties part number "Temp"
